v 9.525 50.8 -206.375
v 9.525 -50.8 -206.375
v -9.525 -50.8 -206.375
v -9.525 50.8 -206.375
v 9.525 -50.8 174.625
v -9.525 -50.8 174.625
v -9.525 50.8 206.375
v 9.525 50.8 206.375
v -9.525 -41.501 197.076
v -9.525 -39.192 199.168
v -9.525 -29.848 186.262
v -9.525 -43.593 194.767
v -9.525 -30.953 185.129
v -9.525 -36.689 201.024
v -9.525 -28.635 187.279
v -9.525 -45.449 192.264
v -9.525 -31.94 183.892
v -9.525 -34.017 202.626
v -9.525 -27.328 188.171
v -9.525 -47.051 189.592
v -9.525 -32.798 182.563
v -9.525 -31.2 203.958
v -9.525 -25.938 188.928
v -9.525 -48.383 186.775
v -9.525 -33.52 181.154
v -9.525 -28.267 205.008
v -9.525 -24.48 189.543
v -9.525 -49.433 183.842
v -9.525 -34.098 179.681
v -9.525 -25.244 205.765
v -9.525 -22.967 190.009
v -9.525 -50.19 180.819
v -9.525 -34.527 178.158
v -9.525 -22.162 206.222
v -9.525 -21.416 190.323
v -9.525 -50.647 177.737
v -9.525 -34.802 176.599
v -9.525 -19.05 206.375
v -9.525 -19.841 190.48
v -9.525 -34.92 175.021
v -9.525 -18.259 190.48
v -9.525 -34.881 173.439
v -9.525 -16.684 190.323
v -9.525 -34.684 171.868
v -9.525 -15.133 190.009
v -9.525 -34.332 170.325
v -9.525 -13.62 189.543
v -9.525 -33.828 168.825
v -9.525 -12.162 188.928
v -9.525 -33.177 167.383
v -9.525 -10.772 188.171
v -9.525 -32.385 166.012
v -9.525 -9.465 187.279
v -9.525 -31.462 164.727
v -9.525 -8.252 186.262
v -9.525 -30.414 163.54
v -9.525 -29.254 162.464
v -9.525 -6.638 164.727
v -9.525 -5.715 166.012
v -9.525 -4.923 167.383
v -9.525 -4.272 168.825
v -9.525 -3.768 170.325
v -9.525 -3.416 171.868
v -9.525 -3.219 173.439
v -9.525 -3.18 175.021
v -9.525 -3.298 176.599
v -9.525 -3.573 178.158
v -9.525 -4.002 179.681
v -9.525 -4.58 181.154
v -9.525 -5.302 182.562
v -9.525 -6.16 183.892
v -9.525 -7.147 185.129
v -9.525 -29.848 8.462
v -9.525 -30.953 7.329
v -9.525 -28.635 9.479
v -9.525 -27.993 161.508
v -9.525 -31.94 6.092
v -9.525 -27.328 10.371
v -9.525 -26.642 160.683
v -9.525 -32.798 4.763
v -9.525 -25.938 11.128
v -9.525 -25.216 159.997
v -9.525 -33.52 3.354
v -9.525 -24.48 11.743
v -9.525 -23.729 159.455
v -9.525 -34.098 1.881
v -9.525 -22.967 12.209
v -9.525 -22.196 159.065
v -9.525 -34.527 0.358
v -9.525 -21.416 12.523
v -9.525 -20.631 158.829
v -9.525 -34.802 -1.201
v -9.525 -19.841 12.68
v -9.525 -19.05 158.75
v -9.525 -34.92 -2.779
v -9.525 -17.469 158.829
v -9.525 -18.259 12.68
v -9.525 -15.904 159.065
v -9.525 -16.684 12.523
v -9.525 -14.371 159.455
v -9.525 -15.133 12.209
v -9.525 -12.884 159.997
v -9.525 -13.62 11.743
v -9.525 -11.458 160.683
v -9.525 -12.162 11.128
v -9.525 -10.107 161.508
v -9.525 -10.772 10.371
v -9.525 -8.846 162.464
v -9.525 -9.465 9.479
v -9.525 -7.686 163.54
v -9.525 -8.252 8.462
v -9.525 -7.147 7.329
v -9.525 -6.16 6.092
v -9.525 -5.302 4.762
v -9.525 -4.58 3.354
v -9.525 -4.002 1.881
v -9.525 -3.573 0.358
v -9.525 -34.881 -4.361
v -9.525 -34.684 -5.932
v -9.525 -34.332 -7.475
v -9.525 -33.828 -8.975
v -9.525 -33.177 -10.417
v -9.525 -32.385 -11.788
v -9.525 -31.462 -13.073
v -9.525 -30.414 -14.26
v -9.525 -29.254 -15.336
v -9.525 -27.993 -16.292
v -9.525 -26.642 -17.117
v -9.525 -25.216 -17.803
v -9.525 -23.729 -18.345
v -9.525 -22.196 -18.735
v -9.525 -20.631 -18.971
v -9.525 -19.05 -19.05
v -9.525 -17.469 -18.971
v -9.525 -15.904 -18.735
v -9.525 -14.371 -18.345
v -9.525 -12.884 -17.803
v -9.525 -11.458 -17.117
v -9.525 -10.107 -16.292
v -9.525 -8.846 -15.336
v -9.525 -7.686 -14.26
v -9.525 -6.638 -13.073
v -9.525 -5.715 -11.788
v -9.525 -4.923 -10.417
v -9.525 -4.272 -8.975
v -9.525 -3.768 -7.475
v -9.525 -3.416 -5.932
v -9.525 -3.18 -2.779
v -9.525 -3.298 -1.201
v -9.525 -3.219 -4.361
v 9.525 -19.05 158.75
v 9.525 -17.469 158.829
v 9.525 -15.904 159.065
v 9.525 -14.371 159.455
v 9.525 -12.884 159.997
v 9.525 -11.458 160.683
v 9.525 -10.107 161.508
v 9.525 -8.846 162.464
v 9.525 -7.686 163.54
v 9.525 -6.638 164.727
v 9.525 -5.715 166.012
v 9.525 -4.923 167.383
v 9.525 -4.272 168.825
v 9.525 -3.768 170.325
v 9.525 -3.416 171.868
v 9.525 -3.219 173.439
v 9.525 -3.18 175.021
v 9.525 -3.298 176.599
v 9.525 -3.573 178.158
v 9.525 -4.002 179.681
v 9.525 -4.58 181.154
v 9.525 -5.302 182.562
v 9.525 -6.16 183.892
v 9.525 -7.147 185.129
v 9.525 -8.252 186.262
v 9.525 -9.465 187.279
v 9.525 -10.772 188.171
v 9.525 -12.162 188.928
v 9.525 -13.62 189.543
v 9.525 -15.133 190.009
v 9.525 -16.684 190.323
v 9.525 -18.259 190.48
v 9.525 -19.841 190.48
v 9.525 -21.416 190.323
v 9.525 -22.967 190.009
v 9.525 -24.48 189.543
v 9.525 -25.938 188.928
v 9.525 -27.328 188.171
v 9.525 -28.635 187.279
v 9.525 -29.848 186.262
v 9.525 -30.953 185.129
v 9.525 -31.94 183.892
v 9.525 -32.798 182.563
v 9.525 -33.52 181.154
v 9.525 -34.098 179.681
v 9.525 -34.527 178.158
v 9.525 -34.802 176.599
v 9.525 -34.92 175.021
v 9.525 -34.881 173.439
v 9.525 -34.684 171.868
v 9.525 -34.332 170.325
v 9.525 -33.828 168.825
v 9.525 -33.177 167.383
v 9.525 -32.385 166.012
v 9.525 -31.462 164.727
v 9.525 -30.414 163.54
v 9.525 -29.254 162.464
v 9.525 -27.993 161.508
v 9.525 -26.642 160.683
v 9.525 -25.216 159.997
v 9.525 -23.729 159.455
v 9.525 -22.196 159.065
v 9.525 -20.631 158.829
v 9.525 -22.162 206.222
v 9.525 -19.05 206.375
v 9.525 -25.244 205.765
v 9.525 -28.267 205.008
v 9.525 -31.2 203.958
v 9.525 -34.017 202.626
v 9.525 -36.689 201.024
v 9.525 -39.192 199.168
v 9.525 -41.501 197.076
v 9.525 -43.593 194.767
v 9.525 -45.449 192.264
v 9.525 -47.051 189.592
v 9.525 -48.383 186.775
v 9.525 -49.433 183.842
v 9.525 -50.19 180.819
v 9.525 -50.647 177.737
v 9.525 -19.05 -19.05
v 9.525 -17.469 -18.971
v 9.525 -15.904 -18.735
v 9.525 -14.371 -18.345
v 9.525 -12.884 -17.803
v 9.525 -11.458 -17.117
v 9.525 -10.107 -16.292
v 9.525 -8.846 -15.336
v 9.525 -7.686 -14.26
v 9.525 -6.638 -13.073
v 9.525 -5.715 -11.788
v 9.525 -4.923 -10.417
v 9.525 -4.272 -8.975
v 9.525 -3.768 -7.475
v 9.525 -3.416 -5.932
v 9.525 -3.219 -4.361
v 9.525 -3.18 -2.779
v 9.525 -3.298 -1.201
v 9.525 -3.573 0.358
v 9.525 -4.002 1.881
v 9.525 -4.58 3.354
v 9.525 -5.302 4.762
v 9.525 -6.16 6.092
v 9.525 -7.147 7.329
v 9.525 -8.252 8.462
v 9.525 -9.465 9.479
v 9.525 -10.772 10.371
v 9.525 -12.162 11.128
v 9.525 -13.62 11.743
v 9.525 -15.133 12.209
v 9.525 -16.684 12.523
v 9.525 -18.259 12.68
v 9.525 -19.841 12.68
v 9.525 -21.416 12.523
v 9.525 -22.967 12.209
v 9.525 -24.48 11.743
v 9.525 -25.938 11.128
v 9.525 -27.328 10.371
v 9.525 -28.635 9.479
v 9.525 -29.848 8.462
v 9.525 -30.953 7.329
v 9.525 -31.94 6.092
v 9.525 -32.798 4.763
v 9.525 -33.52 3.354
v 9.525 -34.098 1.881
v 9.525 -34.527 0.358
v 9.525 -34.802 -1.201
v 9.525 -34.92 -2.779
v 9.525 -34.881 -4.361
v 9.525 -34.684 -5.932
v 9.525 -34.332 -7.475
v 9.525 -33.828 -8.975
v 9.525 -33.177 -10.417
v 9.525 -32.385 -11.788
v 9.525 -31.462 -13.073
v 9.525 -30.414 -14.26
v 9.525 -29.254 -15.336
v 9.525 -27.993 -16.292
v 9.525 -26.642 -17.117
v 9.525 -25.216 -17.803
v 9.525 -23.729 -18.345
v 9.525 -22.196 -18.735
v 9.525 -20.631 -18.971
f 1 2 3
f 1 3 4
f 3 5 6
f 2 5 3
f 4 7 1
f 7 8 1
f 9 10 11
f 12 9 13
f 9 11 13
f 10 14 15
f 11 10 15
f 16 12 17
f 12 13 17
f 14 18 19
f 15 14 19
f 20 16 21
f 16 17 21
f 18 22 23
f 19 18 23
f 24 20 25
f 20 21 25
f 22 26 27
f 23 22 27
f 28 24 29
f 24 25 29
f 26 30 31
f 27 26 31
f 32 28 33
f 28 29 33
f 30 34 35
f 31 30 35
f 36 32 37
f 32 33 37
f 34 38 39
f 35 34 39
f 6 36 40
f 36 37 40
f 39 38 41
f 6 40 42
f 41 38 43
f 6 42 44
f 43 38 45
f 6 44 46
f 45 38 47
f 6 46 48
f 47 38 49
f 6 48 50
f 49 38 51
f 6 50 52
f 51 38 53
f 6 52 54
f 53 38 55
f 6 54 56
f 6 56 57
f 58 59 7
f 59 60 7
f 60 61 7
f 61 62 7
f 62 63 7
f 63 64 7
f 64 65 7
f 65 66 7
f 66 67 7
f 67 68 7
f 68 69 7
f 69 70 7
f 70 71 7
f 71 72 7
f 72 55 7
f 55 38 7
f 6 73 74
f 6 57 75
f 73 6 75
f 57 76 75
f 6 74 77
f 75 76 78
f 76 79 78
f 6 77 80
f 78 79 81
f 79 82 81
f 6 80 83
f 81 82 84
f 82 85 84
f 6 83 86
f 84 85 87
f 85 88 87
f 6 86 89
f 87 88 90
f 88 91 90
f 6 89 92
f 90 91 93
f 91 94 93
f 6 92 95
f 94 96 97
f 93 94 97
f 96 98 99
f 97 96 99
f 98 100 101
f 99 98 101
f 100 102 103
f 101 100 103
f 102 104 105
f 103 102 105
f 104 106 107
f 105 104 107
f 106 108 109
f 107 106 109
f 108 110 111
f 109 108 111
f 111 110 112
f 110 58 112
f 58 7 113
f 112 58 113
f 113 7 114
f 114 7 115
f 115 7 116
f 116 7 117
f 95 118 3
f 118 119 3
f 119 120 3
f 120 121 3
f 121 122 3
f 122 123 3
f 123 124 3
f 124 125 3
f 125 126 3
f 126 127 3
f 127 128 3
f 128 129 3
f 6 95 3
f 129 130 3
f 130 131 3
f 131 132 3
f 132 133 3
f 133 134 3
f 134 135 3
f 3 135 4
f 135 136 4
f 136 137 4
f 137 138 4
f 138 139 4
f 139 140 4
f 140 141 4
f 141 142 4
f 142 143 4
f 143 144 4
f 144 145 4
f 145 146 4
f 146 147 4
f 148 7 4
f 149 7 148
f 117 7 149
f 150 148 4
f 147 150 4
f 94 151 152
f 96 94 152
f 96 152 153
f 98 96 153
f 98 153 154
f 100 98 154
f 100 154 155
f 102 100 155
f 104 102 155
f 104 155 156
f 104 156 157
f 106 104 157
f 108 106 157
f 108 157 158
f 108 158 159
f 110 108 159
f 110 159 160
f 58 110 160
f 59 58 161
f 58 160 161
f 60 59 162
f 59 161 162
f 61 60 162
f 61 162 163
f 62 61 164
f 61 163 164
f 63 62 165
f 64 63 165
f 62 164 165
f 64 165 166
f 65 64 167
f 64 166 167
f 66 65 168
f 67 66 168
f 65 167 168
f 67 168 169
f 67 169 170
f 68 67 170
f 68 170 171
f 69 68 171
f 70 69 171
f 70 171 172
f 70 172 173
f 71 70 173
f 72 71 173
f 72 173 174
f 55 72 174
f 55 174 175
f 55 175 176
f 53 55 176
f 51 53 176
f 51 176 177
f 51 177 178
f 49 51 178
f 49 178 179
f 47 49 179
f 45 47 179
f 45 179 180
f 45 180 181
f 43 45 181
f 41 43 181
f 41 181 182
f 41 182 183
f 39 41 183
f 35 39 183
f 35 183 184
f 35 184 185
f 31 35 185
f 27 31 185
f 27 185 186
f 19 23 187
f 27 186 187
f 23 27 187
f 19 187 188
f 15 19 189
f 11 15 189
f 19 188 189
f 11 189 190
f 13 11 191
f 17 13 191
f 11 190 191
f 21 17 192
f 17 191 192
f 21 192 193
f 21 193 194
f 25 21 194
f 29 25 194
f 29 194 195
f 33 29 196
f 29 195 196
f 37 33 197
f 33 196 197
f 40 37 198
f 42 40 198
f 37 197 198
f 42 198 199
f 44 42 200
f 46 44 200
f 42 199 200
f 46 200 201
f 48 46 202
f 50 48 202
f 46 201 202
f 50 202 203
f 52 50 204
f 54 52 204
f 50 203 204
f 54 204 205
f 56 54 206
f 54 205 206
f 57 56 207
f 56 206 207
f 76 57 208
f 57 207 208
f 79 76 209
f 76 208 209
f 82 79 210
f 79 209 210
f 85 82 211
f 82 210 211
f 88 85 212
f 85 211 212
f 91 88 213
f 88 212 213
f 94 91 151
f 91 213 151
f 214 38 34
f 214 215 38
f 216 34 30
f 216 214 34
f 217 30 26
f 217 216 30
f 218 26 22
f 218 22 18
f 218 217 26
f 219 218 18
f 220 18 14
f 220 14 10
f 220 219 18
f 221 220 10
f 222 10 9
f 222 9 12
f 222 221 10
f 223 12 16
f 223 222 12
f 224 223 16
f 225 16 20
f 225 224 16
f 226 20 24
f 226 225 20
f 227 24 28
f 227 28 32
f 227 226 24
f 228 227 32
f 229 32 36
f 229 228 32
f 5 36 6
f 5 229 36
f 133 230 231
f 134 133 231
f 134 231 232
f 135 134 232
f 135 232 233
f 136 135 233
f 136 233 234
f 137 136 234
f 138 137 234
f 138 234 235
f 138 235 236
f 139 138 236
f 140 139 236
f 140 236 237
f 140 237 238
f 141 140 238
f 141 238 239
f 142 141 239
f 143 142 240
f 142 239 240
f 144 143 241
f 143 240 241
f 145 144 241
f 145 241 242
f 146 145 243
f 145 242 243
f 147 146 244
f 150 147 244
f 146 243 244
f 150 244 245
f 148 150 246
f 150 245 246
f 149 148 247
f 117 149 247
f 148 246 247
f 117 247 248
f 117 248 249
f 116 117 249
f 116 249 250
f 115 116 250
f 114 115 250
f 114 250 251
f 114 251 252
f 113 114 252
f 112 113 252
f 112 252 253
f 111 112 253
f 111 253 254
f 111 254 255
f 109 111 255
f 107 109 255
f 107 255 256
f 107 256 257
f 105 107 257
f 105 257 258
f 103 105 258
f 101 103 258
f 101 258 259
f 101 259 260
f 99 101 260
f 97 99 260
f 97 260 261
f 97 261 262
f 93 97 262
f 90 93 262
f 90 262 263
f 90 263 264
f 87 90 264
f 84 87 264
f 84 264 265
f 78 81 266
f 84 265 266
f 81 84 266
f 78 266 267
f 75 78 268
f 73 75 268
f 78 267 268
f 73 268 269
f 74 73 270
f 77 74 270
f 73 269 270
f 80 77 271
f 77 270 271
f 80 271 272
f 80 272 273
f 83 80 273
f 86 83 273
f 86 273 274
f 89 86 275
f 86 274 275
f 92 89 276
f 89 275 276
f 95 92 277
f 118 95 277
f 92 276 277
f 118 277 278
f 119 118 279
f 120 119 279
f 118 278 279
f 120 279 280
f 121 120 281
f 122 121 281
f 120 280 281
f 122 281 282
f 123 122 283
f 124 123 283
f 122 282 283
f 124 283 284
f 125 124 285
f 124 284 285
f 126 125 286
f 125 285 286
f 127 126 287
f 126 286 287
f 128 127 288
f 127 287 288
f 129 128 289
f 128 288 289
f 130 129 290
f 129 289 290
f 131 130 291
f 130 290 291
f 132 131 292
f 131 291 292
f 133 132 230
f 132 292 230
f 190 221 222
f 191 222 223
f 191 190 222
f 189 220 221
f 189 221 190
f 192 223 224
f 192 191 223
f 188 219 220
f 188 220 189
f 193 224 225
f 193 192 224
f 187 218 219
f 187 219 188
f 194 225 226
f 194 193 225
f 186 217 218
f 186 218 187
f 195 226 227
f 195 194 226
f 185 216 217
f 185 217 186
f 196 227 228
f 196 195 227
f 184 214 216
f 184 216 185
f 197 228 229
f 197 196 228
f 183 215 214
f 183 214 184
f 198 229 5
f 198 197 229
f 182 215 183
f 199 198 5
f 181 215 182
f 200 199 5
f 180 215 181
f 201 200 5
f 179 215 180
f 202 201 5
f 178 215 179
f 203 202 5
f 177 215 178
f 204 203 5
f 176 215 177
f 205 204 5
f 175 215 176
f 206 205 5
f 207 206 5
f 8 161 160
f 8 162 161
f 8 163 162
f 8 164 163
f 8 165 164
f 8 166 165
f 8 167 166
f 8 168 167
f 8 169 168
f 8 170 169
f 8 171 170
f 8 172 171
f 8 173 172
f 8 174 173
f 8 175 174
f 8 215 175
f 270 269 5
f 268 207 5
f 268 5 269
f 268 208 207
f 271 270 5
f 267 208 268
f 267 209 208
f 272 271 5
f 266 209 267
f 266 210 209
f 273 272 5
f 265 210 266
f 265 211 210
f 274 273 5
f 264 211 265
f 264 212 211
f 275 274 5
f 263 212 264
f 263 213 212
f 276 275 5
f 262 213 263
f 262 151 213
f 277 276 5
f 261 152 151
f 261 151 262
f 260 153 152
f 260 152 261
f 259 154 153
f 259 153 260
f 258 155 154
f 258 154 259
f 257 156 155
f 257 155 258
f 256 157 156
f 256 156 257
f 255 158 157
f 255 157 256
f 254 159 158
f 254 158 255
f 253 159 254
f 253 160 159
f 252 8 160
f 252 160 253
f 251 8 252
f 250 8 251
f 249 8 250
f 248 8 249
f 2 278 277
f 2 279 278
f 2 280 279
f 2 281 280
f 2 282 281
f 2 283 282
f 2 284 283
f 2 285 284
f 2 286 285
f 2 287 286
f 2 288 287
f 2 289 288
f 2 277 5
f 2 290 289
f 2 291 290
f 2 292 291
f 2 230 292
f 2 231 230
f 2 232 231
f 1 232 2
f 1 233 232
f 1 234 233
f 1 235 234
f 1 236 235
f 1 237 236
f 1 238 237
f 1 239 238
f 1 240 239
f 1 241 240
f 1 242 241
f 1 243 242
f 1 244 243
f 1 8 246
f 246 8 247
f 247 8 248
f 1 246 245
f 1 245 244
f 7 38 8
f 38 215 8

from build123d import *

# Parameters (mm, degrees)
SKETCH1_W           = 412.75
SKETCH1_H           = 101.6
BOSS_EXTRUDE1_DEPTH = 9.525
CUT_EXTRUDE1_REACH  = 21.05
SKETCH2_R           = 15.875
FILLET1_R           = 31.75


with BuildPart() as part:
    # Sketch1 → Boss-Extrude1 (new body, symmetric)
    with BuildSketch(Plane(origin=(0, 0, 0), x_dir=(0, 0, -1), z_dir=(1, 0, 0))):
        Rectangle(SKETCH1_W, SKETCH1_H)
    extrude(amount=BOSS_EXTRUDE1_DEPTH, both=True)

    # Sketch2 → Cut-Extrude1 (cut, up to next)
    with BuildSketch(Plane(origin=(9.525, 0, 0), x_dir=(0, 0, -1), z_dir=(1, 0, 0)), mode=Mode.PRIVATE) as cut_extrude1_sk1:
        with Locations((-174.625, -19.05)):
            Circle(SKETCH2_R)
    cut_extrude1_tool1 = extrude(cut_extrude1_sk1.sketch, amount=-CUT_EXTRUDE1_REACH, mode=Mode.PRIVATE) & part.part
    add(cut_extrude1_tool1.solids().sort_by_distance((9.525, -19.05, 174.625))[0], mode=Mode.SUBTRACT)
    # Sketch2 → Cut-Extrude1 (cut, up to next)
    with BuildSketch(Plane(origin=(9.525, 0, 0), x_dir=(0, 0, -1), z_dir=(1, 0, 0)), mode=Mode.PRIVATE) as cut_extrude1_sk2:
        with Locations((3.175, -19.05)):
            Circle(SKETCH2_R)
    cut_extrude1_tool2 = extrude(cut_extrude1_sk2.sketch, amount=-CUT_EXTRUDE1_REACH, mode=Mode.PRIVATE) & part.part
    add(cut_extrude1_tool2.solids().sort_by_distance((9.525, -19.05, -3.175))[0], mode=Mode.SUBTRACT)

    # Fillet1
    fillet1_edges = [part.edges().sort_by_distance(p)[0] for p in [
        (0, -50.8, 206.375),
    ]]
    fillet(fillet1_edges, radius=FILLET1_R)


solid = part.part
